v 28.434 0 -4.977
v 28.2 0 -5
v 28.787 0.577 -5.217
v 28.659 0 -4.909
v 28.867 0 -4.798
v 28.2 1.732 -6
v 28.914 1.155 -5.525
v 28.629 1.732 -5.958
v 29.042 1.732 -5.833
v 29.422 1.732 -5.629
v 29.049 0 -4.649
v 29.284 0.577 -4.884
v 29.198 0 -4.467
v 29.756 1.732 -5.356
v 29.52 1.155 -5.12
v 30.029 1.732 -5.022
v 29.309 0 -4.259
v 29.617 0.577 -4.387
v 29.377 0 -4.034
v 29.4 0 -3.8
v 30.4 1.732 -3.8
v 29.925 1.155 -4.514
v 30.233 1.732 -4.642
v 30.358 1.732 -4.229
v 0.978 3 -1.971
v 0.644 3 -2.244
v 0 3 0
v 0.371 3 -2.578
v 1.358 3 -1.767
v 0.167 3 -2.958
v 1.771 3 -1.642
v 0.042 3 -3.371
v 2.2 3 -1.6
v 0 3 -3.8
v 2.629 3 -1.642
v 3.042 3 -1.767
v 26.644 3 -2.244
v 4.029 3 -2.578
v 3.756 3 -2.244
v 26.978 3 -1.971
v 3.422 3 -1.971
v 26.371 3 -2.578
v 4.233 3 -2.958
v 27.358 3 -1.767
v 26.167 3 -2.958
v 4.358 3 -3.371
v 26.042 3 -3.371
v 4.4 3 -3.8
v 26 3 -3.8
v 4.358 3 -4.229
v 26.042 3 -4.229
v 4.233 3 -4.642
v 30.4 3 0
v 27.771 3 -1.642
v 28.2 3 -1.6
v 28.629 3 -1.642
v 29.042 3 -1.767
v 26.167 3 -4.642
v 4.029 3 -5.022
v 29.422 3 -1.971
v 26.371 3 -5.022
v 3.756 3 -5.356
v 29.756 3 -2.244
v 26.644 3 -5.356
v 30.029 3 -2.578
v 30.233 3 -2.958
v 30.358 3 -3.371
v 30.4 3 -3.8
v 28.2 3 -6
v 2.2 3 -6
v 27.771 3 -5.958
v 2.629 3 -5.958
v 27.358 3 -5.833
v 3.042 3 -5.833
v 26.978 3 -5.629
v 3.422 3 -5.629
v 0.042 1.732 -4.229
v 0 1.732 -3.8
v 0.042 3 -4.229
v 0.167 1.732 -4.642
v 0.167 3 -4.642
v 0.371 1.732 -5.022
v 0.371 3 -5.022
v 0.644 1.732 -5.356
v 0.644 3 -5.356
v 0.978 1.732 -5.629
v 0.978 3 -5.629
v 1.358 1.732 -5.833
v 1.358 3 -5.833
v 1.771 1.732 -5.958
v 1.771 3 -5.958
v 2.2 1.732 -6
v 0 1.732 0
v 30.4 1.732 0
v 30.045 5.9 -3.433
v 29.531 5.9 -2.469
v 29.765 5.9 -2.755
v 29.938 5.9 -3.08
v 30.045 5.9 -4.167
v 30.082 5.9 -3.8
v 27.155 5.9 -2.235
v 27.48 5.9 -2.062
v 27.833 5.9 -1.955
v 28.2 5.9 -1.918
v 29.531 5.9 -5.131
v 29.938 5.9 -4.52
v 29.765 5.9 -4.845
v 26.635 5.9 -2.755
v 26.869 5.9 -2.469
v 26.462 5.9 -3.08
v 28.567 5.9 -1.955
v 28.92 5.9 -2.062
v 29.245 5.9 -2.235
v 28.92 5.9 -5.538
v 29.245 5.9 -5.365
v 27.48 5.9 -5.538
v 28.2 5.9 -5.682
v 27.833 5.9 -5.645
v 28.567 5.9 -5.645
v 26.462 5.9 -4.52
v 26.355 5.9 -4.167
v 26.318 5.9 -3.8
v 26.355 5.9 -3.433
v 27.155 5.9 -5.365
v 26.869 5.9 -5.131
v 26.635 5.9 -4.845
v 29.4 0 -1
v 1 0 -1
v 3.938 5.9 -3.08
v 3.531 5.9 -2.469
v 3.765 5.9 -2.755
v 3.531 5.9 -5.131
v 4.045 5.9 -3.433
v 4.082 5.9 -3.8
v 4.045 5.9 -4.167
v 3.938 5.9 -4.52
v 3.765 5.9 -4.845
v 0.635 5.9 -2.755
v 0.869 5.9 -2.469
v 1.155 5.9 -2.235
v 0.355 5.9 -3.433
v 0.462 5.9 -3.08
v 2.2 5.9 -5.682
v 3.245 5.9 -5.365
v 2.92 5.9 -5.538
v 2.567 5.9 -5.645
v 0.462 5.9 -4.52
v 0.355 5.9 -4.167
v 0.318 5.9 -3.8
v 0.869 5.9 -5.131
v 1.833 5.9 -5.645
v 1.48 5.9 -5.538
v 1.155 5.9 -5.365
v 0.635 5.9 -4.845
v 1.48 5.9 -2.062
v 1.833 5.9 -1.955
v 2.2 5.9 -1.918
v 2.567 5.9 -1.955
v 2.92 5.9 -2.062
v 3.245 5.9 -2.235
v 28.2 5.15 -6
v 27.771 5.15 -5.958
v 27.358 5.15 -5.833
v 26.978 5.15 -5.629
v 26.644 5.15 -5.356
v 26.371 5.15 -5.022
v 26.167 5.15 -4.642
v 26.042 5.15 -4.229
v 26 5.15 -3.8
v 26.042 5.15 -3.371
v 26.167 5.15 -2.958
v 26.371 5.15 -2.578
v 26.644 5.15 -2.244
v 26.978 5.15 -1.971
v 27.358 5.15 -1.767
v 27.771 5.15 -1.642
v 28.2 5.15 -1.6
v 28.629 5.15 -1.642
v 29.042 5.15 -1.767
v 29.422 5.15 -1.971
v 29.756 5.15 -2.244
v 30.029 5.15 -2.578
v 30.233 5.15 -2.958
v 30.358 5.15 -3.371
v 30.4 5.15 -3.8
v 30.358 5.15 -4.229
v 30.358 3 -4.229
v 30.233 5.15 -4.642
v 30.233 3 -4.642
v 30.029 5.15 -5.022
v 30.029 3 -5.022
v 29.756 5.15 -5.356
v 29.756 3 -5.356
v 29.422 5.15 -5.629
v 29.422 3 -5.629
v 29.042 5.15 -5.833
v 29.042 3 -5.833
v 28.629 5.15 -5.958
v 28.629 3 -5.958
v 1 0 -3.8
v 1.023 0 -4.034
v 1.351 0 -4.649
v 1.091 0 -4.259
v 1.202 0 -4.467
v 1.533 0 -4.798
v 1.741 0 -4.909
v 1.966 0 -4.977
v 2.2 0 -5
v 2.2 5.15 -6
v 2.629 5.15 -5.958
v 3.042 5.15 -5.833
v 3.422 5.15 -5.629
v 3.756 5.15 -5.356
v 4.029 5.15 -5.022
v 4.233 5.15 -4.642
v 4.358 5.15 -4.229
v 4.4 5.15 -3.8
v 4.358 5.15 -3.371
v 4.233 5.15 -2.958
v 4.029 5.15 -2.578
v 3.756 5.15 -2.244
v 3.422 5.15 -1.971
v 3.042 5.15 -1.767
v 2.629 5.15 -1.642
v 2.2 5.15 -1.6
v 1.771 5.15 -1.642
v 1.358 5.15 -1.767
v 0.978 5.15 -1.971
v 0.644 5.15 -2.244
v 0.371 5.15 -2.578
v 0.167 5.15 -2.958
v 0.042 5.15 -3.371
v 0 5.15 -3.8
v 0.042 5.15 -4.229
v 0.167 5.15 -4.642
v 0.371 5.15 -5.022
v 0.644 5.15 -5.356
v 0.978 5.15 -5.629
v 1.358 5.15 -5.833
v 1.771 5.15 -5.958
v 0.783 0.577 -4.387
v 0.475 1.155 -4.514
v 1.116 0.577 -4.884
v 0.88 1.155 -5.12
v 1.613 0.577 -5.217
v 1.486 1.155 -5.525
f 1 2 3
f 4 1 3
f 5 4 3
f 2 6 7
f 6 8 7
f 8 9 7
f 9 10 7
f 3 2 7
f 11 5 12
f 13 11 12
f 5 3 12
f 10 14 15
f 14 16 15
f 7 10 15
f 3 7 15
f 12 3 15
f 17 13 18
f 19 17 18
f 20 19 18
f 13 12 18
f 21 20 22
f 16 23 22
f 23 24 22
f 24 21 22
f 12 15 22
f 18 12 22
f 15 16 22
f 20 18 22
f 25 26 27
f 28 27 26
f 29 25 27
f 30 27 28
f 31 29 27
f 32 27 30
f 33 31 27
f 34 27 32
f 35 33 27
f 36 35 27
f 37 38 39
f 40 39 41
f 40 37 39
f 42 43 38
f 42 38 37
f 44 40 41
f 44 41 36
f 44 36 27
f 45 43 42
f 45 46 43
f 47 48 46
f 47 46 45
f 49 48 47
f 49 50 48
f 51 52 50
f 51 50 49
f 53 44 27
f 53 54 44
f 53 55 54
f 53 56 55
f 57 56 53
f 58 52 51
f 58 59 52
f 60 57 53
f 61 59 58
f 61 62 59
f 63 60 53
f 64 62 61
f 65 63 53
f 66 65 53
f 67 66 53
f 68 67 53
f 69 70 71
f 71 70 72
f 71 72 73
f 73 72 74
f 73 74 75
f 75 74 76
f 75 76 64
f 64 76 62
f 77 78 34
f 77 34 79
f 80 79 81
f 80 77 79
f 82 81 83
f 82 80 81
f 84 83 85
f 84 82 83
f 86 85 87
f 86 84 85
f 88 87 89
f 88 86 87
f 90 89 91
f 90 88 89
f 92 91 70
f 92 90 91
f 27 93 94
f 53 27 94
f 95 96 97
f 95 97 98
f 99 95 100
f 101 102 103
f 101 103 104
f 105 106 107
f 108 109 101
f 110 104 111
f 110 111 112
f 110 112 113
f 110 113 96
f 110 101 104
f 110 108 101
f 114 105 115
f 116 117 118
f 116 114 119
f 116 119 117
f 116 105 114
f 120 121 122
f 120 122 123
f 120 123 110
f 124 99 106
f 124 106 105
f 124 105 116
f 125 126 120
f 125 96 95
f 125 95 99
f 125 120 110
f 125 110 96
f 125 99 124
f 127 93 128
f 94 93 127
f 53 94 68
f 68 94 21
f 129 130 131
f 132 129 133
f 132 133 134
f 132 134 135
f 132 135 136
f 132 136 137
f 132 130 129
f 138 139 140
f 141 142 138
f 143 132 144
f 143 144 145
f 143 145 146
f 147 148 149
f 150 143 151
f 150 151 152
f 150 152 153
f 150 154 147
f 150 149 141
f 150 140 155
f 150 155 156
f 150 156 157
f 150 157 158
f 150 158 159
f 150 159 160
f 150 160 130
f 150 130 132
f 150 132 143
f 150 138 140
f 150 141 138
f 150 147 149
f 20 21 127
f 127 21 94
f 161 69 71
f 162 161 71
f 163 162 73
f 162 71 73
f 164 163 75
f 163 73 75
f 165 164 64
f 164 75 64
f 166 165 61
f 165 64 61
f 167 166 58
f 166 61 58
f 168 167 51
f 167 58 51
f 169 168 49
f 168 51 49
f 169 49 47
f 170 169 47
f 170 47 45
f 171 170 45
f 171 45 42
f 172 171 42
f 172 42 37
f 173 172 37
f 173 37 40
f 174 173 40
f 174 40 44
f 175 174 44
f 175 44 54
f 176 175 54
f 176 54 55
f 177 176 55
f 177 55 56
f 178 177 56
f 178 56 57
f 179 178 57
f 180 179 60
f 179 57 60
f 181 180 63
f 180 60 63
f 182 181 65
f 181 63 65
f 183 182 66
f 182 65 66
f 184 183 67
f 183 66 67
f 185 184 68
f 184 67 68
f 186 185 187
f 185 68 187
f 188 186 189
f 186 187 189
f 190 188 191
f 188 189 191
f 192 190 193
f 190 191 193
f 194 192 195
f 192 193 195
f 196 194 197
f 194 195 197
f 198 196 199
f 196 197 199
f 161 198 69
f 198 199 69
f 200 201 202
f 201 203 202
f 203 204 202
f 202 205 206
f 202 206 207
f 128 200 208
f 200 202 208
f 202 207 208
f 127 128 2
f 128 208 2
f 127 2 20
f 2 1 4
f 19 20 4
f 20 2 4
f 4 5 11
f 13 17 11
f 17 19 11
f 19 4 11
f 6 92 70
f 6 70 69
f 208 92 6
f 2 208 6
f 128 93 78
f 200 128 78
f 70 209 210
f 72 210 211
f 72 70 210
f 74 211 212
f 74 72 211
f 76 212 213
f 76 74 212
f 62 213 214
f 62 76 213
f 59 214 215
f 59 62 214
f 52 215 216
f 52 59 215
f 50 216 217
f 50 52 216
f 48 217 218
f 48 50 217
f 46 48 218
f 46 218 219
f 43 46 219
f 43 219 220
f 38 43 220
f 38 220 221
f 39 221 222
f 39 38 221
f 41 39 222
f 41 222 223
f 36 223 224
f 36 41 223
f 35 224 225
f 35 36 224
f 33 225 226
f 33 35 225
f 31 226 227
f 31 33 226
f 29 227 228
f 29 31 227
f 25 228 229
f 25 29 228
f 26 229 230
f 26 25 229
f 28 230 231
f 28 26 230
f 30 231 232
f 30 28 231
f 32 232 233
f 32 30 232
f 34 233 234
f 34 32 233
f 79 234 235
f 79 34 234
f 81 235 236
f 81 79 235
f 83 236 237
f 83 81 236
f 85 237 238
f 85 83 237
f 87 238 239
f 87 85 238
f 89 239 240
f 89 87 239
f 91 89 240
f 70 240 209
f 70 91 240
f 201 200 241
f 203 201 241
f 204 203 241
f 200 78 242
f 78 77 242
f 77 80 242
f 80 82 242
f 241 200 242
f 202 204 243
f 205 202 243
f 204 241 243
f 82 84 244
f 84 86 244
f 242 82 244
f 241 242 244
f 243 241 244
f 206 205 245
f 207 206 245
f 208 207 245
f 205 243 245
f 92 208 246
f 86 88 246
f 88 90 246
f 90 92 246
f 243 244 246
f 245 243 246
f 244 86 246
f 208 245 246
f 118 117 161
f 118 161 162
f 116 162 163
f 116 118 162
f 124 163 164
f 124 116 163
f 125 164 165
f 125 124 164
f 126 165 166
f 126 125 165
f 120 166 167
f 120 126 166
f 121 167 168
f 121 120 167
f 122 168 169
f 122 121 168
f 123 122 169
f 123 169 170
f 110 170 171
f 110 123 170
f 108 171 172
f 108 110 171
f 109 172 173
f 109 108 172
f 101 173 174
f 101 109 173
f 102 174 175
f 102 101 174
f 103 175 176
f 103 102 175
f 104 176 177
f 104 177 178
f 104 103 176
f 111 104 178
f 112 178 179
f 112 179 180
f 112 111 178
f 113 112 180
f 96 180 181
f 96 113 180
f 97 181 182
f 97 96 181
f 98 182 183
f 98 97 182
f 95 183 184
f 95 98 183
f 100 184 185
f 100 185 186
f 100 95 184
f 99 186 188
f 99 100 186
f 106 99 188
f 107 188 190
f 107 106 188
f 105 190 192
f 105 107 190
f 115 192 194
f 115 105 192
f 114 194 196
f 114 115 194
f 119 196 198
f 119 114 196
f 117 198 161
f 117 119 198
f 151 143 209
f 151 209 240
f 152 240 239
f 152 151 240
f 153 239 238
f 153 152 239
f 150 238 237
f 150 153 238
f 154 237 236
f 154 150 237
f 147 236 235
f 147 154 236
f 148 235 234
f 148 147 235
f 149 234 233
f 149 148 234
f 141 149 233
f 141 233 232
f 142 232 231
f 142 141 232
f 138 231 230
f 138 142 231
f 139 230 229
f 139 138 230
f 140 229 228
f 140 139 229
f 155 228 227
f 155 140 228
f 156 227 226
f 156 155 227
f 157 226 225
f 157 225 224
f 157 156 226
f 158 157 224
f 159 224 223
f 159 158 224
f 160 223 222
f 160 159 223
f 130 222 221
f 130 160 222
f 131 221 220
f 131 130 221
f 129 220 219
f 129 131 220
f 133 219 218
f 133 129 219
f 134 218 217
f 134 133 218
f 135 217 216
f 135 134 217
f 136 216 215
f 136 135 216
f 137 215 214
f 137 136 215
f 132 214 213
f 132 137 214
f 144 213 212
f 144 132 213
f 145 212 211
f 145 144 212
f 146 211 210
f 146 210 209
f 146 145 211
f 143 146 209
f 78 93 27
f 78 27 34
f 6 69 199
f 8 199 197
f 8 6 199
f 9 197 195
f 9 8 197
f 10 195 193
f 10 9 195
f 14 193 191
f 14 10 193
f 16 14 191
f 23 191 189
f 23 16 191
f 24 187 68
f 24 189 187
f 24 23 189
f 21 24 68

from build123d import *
from OCP.BRepFilletAPI import BRepFilletAPI_MakeChamfer
from build123d.topology import SkipClean

# Parameters (mm, degrees)
SKETCH1_W           = 30.4
SKETCH1_H           = 6
BOSS_EXTRUDE1_DEPTH = 3
SKETCH2_R           = 2.2
BOSS_EXTRUDE2_DEPTH = 2.9
CHAMFER1_SIZE       = 0.75
CHAMFER1_SIZE2      = 0.318356112
CUT_EXTRUDE1_START  = -3
CUT_EXTRUDE1_DEPTH  = 3
CHAMFER2_SIZE       = 1
CHAMFER2_SIZE2      = 1.732050808


with BuildPart() as part:
    # Sketch1 → Boss-Extrude1 (new body)
    with BuildSketch(Plane(origin=(0, 0, 0), x_dir=(1, 0, 0), z_dir=(0, 1, 0))):
        with Locations((15.2, 3)):
            Rectangle(SKETCH1_W, SKETCH1_H)
    extrude(amount=BOSS_EXTRUDE1_DEPTH)

    # Sketch2 → Boss-Extrude2 (add)
    with BuildSketch(Plane(origin=(0, 3, 0), x_dir=(1, 0, 0), z_dir=(0, 1, 0))):
        with Locations(Location((2.2, 3.8, 0), (0, 0, 90))):
            Circle(SKETCH2_R)
        with Locations(Location((28.2, 3.8, 0), (0, 0, 90))):
            Circle(SKETCH2_R)
    extrude(amount=BOSS_EXTRUDE2_DEPTH)

    # Chamfer1: one chamfer whose edges measure the first distance from different faces: ONE call of the kernel's chamfer builder (chamfer() names one face for all edges)
    chamfer1_edges_1 = [part.edges().sort_by_distance(p)[0] for p in [
        (2.2, 5.9, -1.6),
    ]]
    chamfer1_side_1 = [part.faces().sort_by_distance(p)[0] for p in [
        (2.2, 4.45, -1.6),
    ]]
    chamfer1_edges_2 = [part.edges().sort_by_distance(p)[0] for p in [
        (28.2, 5.9, -1.6),
    ]]
    chamfer1_side_2 = [part.faces().sort_by_distance(p)[0] for p in [
        (28.2, 4.45, -1.6),
    ]]
    chamfer1 = BRepFilletAPI_MakeChamfer(part.part.solid().wrapped)
    for e in chamfer1_edges_1:
        chamfer1.Add(CHAMFER1_SIZE, CHAMFER1_SIZE2, e.wrapped, chamfer1_side_1[0].wrapped)  # the first distance lies on this face
    for e in chamfer1_edges_2:
        chamfer1.Add(CHAMFER1_SIZE, CHAMFER1_SIZE2, e.wrapped, chamfer1_side_2[0].wrapped)  # the first distance lies on this face
    add(Compound.cast(chamfer1.Shape()), mode=Mode.REPLACE)

    # Sketch3 → Cut-Extrude1 (cut)
    with SkipClean():  # the faces are left unmerged after this step: merging them gives an invalid solid
        with BuildSketch(Plane(origin=(0, 3, 0), x_dir=(1, 0, 0), z_dir=(0, 1, 0)).offset(CUT_EXTRUDE1_START)):
            with BuildLine():
                Line((30.4, 3.8), (30.4, 6))
                Line((30.4, 6), (28.2, 6))
                ThreePointArc((28.2, 6), (29.755634919, 5.355634919), (30.4, 3.8))
            make_face()
            with BuildLine():
                Line((2.2, 6), (0, 6))
                Line((0, 6), (0, 3.8))
                ThreePointArc((0, 3.8), (0.644365081, 5.355634919), (2.2, 6))
            make_face()
        extrude(amount=CUT_EXTRUDE1_DEPTH, mode=Mode.SUBTRACT)

    # Chamfer2
    chamfer2_edges = [part.edges().sort_by_distance(p)[0] for p in [
        (0, 0, -1.9),
        (15.2, 0, -6),
        (29.755634919, 0, -5.355634919),
        (0.644365081, 0, -5.355634919),
        (30.4, 0, -1.9),
        (15.2, 0, 0),
    ]]
    chamfer2_side = [part.faces().sort_by_distance(p)[0] for p in [
        (15.2, 0, -2.971100636),
    ]]
    chamfer(chamfer2_edges, length=CHAMFER2_SIZE, length2=CHAMFER2_SIZE2, reference=chamfer2_side[0])


solid = part.part
